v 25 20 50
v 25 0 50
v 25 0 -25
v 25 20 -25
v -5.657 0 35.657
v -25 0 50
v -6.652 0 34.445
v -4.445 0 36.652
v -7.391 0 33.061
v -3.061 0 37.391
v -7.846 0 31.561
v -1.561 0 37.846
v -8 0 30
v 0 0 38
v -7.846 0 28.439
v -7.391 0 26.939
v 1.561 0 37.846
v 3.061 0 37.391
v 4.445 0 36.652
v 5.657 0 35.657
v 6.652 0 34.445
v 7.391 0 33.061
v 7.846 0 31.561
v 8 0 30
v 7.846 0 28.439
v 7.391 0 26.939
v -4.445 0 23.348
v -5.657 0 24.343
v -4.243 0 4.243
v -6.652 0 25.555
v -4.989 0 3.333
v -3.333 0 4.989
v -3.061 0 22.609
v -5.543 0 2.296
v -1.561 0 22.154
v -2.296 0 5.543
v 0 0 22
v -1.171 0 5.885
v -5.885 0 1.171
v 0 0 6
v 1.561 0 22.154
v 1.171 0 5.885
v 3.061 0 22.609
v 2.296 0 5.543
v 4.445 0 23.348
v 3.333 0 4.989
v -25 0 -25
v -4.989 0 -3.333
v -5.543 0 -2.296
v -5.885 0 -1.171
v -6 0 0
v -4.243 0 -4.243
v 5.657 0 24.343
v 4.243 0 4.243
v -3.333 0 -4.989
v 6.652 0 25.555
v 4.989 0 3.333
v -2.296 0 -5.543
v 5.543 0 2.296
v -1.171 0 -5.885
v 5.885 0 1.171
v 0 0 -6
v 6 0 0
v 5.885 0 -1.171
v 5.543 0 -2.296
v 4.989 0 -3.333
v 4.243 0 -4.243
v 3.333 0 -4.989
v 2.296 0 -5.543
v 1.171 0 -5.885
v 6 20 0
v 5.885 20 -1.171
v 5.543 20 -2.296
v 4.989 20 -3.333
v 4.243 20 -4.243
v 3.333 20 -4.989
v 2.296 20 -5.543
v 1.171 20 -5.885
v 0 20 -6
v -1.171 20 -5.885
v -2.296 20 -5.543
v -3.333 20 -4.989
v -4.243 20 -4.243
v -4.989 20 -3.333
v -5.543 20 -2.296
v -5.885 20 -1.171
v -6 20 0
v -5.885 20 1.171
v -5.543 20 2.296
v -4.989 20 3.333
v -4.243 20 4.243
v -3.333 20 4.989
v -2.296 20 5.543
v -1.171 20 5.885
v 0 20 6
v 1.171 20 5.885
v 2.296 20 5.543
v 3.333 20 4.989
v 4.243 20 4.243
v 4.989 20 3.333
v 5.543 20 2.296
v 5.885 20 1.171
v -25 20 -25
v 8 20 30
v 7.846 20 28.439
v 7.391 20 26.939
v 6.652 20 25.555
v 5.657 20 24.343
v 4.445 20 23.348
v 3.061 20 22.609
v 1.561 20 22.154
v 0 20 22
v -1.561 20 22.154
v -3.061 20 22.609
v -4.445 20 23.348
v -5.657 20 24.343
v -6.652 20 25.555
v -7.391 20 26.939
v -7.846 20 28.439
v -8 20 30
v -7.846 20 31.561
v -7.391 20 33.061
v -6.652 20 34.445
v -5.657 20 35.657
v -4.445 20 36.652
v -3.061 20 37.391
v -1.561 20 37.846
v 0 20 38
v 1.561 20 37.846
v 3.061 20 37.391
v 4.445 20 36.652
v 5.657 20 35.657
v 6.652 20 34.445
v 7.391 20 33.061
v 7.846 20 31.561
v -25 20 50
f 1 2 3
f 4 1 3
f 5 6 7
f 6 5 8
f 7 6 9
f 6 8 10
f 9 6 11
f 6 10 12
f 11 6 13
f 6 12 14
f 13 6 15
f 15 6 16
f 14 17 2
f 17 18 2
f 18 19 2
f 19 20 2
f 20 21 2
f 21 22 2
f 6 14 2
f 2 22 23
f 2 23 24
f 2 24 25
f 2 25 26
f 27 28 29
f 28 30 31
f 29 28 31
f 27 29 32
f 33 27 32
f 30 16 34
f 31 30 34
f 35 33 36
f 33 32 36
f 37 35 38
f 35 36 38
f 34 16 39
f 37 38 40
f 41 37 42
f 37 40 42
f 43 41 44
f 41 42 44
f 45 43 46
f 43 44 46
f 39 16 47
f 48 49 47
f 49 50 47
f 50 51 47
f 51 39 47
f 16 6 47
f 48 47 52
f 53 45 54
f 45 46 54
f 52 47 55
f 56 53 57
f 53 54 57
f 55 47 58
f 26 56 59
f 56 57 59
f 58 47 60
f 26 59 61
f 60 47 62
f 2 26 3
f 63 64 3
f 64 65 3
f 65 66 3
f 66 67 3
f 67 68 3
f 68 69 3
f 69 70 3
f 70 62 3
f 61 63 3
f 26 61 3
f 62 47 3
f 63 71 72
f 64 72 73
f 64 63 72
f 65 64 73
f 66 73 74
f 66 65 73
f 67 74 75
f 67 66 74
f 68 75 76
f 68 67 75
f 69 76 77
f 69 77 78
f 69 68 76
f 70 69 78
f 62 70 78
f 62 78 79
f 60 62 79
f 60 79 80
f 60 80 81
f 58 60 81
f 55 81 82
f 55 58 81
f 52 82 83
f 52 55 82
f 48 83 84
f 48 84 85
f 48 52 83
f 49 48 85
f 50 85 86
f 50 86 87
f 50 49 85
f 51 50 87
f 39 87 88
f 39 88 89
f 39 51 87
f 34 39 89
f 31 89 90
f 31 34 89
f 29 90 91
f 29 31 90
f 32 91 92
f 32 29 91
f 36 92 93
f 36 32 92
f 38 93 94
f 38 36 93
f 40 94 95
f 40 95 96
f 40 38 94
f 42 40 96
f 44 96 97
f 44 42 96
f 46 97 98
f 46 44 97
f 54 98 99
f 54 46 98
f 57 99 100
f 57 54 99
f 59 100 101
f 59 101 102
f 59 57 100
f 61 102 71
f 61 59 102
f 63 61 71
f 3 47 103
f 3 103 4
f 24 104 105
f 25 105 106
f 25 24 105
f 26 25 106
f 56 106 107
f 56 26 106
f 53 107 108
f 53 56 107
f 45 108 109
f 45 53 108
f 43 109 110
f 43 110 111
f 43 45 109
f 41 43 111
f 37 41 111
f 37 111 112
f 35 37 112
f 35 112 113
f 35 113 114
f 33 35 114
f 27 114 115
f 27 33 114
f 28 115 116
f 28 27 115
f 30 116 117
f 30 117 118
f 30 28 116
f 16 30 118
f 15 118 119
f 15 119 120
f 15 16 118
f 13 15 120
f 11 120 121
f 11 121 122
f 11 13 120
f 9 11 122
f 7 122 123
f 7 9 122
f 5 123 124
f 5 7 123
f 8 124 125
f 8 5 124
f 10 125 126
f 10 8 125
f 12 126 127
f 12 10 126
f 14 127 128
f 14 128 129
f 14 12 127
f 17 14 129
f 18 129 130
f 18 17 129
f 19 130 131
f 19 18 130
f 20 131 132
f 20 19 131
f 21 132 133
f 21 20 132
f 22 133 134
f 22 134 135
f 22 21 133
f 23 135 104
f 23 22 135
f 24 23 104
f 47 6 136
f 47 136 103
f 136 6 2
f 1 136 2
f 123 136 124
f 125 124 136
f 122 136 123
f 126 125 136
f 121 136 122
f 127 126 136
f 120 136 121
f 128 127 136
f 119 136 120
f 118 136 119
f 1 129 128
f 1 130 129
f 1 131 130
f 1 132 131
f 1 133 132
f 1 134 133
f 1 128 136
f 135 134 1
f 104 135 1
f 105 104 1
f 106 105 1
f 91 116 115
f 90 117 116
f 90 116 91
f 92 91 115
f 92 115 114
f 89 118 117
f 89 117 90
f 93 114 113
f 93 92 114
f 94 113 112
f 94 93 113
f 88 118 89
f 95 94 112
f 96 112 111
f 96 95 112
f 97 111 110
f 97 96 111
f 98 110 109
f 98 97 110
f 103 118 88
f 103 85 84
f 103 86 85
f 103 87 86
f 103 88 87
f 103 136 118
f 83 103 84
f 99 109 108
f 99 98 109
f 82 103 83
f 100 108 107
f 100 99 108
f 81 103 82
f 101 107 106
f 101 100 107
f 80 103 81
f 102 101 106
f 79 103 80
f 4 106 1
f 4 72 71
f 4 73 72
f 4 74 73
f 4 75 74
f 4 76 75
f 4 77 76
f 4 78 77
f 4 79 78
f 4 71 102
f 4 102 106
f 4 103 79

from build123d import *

# Parameters (mm, degrees)
SKETCH1_W           = 50
SKETCH1_H           = 75
SKETCH1_R           = 6
SKETCH1_R_2         = 8
BOSS_EXTRUDE1_DEPTH = 20


with BuildPart() as part:
    # Sketch1 → Boss-Extrude1 (new body)
    with BuildSketch(Plane(origin=(0, 0, 0), x_dir=(1, 0, 0), z_dir=(0, 1, 0))):
        with Locations((0, -12.5)):
            Rectangle(SKETCH1_W, SKETCH1_H)
        Circle(SKETCH1_R, mode=Mode.SUBTRACT)
        with Locations((0, -30)):
            Circle(SKETCH1_R_2, mode=Mode.SUBTRACT)
    extrude(amount=BOSS_EXTRUDE1_DEPTH)


solid = part.part
